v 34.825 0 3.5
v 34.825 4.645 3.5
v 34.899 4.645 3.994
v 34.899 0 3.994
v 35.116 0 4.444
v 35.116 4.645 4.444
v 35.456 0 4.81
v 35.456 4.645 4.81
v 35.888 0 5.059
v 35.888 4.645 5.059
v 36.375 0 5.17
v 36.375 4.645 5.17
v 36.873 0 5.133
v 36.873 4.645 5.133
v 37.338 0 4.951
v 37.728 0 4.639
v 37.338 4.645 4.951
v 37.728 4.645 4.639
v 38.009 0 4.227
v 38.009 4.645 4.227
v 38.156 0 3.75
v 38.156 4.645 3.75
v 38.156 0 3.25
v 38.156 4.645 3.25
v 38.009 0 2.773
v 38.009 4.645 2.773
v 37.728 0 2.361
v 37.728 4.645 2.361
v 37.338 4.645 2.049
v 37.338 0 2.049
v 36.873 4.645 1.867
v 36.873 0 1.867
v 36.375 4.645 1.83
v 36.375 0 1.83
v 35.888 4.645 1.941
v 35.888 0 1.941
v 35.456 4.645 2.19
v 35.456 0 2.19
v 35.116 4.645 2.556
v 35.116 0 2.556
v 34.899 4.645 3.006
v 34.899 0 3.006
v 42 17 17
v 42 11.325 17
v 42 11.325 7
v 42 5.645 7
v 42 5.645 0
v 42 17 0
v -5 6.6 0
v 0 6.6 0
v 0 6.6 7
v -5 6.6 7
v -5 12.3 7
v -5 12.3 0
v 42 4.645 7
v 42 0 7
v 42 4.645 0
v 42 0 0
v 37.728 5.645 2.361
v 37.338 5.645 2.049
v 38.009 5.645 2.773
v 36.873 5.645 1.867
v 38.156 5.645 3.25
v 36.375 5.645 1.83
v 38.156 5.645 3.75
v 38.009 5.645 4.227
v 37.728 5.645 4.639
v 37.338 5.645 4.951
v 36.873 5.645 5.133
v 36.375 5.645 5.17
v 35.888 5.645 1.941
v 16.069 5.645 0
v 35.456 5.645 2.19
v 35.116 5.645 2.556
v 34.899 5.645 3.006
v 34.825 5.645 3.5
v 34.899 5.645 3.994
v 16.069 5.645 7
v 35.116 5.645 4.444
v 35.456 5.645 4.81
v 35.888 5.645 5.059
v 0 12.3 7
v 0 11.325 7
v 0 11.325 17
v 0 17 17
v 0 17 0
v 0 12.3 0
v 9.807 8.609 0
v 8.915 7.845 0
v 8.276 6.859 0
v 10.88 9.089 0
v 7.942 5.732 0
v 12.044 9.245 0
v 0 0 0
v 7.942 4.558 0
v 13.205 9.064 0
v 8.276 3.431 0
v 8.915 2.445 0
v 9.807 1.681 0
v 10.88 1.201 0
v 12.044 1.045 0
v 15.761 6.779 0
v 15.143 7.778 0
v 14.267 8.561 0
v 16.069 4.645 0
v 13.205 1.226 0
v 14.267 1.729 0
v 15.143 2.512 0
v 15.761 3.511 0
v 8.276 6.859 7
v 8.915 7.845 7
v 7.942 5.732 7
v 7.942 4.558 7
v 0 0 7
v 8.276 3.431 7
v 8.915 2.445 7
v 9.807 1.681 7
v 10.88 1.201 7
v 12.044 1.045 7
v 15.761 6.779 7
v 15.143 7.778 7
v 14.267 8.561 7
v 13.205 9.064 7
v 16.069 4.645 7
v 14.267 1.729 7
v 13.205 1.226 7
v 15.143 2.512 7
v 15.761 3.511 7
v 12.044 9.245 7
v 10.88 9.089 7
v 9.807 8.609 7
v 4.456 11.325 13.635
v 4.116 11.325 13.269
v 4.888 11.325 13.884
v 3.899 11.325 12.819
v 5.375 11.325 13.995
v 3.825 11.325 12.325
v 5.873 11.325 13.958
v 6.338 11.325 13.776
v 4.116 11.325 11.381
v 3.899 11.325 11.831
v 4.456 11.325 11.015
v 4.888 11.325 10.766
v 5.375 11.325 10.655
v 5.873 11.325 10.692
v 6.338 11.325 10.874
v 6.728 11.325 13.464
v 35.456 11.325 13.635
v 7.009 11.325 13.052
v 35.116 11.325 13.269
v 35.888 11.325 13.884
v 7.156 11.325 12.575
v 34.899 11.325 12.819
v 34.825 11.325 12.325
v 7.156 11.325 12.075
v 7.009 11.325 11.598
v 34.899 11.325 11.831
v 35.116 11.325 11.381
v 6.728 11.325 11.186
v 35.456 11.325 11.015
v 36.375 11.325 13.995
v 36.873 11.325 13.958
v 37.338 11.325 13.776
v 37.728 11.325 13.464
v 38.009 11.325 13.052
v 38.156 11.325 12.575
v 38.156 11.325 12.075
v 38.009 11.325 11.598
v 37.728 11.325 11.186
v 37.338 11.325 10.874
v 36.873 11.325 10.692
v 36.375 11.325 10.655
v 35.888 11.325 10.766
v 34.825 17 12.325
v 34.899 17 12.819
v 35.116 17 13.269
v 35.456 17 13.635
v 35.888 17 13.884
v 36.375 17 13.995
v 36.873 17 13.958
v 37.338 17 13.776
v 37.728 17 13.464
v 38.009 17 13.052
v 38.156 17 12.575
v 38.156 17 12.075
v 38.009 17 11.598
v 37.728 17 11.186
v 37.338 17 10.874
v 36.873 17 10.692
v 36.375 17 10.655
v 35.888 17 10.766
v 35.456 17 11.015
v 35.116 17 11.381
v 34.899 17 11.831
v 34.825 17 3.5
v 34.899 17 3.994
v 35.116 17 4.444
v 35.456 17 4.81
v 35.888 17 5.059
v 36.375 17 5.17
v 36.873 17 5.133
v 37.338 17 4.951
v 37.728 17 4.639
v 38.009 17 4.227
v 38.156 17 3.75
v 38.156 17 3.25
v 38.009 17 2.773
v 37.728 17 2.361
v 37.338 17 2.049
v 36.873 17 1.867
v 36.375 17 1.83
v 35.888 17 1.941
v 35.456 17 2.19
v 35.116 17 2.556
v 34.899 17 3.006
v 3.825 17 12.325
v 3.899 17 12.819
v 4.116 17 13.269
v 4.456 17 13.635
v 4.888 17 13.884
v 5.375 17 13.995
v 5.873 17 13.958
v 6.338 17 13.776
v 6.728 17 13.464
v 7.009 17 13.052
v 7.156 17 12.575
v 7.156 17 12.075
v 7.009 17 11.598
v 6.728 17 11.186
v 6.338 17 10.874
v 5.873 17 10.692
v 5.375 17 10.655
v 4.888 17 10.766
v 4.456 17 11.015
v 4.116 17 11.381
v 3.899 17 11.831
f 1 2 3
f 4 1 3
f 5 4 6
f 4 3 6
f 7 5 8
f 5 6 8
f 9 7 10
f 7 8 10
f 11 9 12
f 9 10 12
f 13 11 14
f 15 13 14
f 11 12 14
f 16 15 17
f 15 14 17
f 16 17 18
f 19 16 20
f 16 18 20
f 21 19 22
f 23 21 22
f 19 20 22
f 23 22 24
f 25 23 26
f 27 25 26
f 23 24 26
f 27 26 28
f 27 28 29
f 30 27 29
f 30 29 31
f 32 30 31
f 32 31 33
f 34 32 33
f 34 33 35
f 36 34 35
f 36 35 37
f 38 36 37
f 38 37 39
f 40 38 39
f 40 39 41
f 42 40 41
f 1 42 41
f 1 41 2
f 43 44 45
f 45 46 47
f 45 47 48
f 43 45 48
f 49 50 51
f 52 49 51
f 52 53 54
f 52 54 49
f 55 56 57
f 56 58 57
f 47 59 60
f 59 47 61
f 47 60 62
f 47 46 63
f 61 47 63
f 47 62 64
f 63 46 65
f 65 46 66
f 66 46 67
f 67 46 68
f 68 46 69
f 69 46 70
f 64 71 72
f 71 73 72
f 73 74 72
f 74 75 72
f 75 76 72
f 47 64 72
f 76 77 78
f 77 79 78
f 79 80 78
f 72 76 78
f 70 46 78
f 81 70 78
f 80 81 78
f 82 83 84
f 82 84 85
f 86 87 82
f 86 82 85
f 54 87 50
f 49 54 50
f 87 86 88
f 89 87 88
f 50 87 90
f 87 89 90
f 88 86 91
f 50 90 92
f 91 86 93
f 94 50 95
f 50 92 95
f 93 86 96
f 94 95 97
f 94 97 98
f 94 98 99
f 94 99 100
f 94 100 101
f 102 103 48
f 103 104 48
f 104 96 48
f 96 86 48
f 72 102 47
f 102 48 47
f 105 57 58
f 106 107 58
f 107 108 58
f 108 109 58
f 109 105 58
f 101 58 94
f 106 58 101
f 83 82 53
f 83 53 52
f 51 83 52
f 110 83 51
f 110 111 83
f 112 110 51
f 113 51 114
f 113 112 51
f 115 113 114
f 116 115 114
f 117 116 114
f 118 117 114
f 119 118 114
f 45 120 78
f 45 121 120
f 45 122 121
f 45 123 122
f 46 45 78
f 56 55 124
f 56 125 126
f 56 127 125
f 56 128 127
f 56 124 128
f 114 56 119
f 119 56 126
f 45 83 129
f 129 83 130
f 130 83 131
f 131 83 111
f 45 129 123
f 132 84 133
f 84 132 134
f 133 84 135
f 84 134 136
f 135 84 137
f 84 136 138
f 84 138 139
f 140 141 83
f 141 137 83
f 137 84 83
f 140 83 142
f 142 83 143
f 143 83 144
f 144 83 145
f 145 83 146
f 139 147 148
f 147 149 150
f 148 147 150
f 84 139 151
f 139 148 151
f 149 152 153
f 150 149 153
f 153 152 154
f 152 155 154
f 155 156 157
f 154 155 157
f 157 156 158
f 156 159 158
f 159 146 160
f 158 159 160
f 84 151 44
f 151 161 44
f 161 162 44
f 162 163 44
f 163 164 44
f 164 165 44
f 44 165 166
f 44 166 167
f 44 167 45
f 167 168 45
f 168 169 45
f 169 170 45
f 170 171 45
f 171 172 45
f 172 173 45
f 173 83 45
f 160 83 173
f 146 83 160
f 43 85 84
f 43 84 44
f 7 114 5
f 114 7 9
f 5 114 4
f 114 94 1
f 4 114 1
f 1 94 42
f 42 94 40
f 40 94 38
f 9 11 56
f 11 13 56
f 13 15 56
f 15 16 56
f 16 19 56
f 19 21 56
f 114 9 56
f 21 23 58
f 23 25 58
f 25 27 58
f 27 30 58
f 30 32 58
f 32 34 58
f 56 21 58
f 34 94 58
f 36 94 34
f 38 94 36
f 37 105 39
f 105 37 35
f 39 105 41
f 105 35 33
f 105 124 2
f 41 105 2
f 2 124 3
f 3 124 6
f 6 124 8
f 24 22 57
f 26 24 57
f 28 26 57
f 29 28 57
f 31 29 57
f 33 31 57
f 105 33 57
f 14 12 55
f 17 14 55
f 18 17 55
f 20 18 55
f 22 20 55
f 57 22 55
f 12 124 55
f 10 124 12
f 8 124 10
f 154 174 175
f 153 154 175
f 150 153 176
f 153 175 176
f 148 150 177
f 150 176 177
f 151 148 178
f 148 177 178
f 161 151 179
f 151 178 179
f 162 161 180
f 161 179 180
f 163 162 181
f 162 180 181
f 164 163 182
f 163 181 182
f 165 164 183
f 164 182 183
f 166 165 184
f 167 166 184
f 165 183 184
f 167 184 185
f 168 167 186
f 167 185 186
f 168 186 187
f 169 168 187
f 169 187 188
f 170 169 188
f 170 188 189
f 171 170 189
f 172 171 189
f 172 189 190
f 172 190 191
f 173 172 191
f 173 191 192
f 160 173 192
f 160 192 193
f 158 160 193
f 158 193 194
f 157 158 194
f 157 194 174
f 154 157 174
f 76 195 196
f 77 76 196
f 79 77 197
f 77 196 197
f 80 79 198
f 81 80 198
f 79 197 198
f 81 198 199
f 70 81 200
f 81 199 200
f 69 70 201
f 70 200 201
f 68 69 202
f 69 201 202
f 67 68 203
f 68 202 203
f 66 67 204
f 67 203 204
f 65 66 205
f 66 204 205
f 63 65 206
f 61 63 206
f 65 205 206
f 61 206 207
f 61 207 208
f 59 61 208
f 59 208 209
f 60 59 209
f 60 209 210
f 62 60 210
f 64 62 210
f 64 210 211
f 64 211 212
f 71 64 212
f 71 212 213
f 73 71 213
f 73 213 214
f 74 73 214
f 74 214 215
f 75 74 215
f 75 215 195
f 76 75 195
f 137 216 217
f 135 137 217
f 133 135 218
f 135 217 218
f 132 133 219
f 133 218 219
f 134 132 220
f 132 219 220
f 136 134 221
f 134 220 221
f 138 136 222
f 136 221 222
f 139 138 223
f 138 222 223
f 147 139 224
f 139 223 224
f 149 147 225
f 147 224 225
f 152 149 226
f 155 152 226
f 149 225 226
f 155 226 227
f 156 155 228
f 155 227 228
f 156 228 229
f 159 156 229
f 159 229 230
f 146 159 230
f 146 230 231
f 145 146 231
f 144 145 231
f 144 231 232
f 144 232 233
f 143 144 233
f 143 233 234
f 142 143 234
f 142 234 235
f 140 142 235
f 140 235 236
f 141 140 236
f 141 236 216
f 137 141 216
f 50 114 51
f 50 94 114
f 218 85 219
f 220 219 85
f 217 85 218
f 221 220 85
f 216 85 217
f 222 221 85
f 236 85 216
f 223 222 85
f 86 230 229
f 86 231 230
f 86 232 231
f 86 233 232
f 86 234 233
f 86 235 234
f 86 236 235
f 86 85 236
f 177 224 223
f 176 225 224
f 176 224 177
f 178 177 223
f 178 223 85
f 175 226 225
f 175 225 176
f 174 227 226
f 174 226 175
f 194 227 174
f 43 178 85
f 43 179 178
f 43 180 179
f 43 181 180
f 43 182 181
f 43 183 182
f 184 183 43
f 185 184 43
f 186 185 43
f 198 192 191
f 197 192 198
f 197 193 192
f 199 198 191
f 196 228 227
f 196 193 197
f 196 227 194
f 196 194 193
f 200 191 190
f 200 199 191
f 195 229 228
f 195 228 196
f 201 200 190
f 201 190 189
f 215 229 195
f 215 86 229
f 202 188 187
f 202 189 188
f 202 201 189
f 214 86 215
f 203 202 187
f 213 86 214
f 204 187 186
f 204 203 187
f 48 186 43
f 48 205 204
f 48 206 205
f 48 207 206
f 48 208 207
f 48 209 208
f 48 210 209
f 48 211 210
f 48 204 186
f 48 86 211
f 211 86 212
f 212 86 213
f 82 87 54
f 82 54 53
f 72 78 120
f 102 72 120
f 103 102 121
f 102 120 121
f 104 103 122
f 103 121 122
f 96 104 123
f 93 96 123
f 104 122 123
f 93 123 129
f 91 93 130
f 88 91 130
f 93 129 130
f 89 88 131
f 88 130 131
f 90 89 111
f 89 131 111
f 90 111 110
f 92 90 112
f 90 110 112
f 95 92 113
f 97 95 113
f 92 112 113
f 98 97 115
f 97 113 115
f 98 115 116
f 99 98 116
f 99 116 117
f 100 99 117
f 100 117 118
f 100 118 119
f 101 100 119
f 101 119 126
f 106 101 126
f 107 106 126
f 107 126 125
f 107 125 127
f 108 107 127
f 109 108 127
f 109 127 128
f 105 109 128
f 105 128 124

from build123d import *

# Parameters (mm, degrees)
F0_W      = 42
F0_H      = 17
F1_DEPTH  = 7
F4_DEPTH  = 25
F5_W      = 42
F5_H      = 5.6745335534
F6_DEPTH  = 10
F7_R      = 1.675
F8_DEPTH  = 25
F9_DEPTH  = 25
F11_W     = 5.7
F11_H     = 7
F12_DEPTH = 5


with BuildPart() as f1:
    # F0 (on Top) → F1 (new body)
    with BuildSketch(Plane.XY):
        with Locations((21, 8.5)):
            Rectangle(F0_W, F0_H)
    extrude(amount=F1_DEPTH)

    # F3 (on face) → F4 (cut)
    with BuildSketch(Plane(origin=(0, 17, 0), x_dir=(-1, 0, 0), z_dir=(0, 1, 0))):
        with BuildLine():
            ThreePointArc((-38.175, 3.5), (-36.5, 1.825), (-34.825, 3.5))
            ThreePointArc((-34.825, 3.5), (-36.5, 5.175), (-38.175, 3.5))
        make_face()
    extrude(amount=-F4_DEPTH, mode=Mode.SUBTRACT)

    # F5 (on face) → F6 (join)
    with BuildSketch(Plane.XY.offset(7)):
        with Locations((21, 14.1627332233)):
            Rectangle(F5_W, F5_H)
    extrude(amount=F6_DEPTH)

    # F7 (on face) → F8 (cut)
    with BuildSketch(Plane(origin=(0, 17, 0), x_dir=(-1, 0, 0), z_dir=(0, 1, 0))):
        with Locations((-36.5, 12.325)):
            Circle(F7_R)
        with Locations((-5.5, 12.325)):
            Circle(F7_R)
    extrude(amount=-F8_DEPTH, mode=Mode.SUBTRACT)

    # F2 (on face) → F9 (cut)
    with BuildSketch(Plane.XY.offset(7)):
        with BuildLine():
            ThreePointArc((16.0693979899, 4.645), (16.0923423463, 4.8945321962), (16.1, 5.145))
            ThreePointArc((16.1, 5.145), (16.0923423463, 5.3954678038), (16.0693979899, 5.645))
            ThreePointArc((16.0693979899, 5.645), (7.9, 5.145), (16.0693979899, 4.645))
        make_face()
        with BuildLine():
            Line((42, 5.145), (16.1, 5.145))
            ThreePointArc((16.1, 5.145), (16.0923423463, 4.8945321962), (16.0693979899, 4.645))
            Line((16.0693979899, 4.645), (42, 4.645))
            Line((42, 4.645), (42, 5.145))
        make_face()
        with BuildLine():
            ThreePointArc((16.0693979899, 5.645), (16.0923423463, 5.3954678038), (16.1, 5.145))
            Line((16.1, 5.145), (42, 5.145))
            Line((42, 5.145), (42, 5.645))
            Line((42, 5.645), (16.0693979899, 5.645))
        make_face()
    extrude(amount=-F9_DEPTH, mode=Mode.SUBTRACT)

    # F11 (on face) → F12 (join)
    with BuildSketch(Plane(origin=(0, 0, 0), x_dir=(0, -1, 0), z_dir=(-1, 0, 0))):
        with Locations((-9.45, 3.5)):
            Rectangle(F11_W, F11_H)
    extrude(amount=F12_DEPTH)


solid = f1.part
